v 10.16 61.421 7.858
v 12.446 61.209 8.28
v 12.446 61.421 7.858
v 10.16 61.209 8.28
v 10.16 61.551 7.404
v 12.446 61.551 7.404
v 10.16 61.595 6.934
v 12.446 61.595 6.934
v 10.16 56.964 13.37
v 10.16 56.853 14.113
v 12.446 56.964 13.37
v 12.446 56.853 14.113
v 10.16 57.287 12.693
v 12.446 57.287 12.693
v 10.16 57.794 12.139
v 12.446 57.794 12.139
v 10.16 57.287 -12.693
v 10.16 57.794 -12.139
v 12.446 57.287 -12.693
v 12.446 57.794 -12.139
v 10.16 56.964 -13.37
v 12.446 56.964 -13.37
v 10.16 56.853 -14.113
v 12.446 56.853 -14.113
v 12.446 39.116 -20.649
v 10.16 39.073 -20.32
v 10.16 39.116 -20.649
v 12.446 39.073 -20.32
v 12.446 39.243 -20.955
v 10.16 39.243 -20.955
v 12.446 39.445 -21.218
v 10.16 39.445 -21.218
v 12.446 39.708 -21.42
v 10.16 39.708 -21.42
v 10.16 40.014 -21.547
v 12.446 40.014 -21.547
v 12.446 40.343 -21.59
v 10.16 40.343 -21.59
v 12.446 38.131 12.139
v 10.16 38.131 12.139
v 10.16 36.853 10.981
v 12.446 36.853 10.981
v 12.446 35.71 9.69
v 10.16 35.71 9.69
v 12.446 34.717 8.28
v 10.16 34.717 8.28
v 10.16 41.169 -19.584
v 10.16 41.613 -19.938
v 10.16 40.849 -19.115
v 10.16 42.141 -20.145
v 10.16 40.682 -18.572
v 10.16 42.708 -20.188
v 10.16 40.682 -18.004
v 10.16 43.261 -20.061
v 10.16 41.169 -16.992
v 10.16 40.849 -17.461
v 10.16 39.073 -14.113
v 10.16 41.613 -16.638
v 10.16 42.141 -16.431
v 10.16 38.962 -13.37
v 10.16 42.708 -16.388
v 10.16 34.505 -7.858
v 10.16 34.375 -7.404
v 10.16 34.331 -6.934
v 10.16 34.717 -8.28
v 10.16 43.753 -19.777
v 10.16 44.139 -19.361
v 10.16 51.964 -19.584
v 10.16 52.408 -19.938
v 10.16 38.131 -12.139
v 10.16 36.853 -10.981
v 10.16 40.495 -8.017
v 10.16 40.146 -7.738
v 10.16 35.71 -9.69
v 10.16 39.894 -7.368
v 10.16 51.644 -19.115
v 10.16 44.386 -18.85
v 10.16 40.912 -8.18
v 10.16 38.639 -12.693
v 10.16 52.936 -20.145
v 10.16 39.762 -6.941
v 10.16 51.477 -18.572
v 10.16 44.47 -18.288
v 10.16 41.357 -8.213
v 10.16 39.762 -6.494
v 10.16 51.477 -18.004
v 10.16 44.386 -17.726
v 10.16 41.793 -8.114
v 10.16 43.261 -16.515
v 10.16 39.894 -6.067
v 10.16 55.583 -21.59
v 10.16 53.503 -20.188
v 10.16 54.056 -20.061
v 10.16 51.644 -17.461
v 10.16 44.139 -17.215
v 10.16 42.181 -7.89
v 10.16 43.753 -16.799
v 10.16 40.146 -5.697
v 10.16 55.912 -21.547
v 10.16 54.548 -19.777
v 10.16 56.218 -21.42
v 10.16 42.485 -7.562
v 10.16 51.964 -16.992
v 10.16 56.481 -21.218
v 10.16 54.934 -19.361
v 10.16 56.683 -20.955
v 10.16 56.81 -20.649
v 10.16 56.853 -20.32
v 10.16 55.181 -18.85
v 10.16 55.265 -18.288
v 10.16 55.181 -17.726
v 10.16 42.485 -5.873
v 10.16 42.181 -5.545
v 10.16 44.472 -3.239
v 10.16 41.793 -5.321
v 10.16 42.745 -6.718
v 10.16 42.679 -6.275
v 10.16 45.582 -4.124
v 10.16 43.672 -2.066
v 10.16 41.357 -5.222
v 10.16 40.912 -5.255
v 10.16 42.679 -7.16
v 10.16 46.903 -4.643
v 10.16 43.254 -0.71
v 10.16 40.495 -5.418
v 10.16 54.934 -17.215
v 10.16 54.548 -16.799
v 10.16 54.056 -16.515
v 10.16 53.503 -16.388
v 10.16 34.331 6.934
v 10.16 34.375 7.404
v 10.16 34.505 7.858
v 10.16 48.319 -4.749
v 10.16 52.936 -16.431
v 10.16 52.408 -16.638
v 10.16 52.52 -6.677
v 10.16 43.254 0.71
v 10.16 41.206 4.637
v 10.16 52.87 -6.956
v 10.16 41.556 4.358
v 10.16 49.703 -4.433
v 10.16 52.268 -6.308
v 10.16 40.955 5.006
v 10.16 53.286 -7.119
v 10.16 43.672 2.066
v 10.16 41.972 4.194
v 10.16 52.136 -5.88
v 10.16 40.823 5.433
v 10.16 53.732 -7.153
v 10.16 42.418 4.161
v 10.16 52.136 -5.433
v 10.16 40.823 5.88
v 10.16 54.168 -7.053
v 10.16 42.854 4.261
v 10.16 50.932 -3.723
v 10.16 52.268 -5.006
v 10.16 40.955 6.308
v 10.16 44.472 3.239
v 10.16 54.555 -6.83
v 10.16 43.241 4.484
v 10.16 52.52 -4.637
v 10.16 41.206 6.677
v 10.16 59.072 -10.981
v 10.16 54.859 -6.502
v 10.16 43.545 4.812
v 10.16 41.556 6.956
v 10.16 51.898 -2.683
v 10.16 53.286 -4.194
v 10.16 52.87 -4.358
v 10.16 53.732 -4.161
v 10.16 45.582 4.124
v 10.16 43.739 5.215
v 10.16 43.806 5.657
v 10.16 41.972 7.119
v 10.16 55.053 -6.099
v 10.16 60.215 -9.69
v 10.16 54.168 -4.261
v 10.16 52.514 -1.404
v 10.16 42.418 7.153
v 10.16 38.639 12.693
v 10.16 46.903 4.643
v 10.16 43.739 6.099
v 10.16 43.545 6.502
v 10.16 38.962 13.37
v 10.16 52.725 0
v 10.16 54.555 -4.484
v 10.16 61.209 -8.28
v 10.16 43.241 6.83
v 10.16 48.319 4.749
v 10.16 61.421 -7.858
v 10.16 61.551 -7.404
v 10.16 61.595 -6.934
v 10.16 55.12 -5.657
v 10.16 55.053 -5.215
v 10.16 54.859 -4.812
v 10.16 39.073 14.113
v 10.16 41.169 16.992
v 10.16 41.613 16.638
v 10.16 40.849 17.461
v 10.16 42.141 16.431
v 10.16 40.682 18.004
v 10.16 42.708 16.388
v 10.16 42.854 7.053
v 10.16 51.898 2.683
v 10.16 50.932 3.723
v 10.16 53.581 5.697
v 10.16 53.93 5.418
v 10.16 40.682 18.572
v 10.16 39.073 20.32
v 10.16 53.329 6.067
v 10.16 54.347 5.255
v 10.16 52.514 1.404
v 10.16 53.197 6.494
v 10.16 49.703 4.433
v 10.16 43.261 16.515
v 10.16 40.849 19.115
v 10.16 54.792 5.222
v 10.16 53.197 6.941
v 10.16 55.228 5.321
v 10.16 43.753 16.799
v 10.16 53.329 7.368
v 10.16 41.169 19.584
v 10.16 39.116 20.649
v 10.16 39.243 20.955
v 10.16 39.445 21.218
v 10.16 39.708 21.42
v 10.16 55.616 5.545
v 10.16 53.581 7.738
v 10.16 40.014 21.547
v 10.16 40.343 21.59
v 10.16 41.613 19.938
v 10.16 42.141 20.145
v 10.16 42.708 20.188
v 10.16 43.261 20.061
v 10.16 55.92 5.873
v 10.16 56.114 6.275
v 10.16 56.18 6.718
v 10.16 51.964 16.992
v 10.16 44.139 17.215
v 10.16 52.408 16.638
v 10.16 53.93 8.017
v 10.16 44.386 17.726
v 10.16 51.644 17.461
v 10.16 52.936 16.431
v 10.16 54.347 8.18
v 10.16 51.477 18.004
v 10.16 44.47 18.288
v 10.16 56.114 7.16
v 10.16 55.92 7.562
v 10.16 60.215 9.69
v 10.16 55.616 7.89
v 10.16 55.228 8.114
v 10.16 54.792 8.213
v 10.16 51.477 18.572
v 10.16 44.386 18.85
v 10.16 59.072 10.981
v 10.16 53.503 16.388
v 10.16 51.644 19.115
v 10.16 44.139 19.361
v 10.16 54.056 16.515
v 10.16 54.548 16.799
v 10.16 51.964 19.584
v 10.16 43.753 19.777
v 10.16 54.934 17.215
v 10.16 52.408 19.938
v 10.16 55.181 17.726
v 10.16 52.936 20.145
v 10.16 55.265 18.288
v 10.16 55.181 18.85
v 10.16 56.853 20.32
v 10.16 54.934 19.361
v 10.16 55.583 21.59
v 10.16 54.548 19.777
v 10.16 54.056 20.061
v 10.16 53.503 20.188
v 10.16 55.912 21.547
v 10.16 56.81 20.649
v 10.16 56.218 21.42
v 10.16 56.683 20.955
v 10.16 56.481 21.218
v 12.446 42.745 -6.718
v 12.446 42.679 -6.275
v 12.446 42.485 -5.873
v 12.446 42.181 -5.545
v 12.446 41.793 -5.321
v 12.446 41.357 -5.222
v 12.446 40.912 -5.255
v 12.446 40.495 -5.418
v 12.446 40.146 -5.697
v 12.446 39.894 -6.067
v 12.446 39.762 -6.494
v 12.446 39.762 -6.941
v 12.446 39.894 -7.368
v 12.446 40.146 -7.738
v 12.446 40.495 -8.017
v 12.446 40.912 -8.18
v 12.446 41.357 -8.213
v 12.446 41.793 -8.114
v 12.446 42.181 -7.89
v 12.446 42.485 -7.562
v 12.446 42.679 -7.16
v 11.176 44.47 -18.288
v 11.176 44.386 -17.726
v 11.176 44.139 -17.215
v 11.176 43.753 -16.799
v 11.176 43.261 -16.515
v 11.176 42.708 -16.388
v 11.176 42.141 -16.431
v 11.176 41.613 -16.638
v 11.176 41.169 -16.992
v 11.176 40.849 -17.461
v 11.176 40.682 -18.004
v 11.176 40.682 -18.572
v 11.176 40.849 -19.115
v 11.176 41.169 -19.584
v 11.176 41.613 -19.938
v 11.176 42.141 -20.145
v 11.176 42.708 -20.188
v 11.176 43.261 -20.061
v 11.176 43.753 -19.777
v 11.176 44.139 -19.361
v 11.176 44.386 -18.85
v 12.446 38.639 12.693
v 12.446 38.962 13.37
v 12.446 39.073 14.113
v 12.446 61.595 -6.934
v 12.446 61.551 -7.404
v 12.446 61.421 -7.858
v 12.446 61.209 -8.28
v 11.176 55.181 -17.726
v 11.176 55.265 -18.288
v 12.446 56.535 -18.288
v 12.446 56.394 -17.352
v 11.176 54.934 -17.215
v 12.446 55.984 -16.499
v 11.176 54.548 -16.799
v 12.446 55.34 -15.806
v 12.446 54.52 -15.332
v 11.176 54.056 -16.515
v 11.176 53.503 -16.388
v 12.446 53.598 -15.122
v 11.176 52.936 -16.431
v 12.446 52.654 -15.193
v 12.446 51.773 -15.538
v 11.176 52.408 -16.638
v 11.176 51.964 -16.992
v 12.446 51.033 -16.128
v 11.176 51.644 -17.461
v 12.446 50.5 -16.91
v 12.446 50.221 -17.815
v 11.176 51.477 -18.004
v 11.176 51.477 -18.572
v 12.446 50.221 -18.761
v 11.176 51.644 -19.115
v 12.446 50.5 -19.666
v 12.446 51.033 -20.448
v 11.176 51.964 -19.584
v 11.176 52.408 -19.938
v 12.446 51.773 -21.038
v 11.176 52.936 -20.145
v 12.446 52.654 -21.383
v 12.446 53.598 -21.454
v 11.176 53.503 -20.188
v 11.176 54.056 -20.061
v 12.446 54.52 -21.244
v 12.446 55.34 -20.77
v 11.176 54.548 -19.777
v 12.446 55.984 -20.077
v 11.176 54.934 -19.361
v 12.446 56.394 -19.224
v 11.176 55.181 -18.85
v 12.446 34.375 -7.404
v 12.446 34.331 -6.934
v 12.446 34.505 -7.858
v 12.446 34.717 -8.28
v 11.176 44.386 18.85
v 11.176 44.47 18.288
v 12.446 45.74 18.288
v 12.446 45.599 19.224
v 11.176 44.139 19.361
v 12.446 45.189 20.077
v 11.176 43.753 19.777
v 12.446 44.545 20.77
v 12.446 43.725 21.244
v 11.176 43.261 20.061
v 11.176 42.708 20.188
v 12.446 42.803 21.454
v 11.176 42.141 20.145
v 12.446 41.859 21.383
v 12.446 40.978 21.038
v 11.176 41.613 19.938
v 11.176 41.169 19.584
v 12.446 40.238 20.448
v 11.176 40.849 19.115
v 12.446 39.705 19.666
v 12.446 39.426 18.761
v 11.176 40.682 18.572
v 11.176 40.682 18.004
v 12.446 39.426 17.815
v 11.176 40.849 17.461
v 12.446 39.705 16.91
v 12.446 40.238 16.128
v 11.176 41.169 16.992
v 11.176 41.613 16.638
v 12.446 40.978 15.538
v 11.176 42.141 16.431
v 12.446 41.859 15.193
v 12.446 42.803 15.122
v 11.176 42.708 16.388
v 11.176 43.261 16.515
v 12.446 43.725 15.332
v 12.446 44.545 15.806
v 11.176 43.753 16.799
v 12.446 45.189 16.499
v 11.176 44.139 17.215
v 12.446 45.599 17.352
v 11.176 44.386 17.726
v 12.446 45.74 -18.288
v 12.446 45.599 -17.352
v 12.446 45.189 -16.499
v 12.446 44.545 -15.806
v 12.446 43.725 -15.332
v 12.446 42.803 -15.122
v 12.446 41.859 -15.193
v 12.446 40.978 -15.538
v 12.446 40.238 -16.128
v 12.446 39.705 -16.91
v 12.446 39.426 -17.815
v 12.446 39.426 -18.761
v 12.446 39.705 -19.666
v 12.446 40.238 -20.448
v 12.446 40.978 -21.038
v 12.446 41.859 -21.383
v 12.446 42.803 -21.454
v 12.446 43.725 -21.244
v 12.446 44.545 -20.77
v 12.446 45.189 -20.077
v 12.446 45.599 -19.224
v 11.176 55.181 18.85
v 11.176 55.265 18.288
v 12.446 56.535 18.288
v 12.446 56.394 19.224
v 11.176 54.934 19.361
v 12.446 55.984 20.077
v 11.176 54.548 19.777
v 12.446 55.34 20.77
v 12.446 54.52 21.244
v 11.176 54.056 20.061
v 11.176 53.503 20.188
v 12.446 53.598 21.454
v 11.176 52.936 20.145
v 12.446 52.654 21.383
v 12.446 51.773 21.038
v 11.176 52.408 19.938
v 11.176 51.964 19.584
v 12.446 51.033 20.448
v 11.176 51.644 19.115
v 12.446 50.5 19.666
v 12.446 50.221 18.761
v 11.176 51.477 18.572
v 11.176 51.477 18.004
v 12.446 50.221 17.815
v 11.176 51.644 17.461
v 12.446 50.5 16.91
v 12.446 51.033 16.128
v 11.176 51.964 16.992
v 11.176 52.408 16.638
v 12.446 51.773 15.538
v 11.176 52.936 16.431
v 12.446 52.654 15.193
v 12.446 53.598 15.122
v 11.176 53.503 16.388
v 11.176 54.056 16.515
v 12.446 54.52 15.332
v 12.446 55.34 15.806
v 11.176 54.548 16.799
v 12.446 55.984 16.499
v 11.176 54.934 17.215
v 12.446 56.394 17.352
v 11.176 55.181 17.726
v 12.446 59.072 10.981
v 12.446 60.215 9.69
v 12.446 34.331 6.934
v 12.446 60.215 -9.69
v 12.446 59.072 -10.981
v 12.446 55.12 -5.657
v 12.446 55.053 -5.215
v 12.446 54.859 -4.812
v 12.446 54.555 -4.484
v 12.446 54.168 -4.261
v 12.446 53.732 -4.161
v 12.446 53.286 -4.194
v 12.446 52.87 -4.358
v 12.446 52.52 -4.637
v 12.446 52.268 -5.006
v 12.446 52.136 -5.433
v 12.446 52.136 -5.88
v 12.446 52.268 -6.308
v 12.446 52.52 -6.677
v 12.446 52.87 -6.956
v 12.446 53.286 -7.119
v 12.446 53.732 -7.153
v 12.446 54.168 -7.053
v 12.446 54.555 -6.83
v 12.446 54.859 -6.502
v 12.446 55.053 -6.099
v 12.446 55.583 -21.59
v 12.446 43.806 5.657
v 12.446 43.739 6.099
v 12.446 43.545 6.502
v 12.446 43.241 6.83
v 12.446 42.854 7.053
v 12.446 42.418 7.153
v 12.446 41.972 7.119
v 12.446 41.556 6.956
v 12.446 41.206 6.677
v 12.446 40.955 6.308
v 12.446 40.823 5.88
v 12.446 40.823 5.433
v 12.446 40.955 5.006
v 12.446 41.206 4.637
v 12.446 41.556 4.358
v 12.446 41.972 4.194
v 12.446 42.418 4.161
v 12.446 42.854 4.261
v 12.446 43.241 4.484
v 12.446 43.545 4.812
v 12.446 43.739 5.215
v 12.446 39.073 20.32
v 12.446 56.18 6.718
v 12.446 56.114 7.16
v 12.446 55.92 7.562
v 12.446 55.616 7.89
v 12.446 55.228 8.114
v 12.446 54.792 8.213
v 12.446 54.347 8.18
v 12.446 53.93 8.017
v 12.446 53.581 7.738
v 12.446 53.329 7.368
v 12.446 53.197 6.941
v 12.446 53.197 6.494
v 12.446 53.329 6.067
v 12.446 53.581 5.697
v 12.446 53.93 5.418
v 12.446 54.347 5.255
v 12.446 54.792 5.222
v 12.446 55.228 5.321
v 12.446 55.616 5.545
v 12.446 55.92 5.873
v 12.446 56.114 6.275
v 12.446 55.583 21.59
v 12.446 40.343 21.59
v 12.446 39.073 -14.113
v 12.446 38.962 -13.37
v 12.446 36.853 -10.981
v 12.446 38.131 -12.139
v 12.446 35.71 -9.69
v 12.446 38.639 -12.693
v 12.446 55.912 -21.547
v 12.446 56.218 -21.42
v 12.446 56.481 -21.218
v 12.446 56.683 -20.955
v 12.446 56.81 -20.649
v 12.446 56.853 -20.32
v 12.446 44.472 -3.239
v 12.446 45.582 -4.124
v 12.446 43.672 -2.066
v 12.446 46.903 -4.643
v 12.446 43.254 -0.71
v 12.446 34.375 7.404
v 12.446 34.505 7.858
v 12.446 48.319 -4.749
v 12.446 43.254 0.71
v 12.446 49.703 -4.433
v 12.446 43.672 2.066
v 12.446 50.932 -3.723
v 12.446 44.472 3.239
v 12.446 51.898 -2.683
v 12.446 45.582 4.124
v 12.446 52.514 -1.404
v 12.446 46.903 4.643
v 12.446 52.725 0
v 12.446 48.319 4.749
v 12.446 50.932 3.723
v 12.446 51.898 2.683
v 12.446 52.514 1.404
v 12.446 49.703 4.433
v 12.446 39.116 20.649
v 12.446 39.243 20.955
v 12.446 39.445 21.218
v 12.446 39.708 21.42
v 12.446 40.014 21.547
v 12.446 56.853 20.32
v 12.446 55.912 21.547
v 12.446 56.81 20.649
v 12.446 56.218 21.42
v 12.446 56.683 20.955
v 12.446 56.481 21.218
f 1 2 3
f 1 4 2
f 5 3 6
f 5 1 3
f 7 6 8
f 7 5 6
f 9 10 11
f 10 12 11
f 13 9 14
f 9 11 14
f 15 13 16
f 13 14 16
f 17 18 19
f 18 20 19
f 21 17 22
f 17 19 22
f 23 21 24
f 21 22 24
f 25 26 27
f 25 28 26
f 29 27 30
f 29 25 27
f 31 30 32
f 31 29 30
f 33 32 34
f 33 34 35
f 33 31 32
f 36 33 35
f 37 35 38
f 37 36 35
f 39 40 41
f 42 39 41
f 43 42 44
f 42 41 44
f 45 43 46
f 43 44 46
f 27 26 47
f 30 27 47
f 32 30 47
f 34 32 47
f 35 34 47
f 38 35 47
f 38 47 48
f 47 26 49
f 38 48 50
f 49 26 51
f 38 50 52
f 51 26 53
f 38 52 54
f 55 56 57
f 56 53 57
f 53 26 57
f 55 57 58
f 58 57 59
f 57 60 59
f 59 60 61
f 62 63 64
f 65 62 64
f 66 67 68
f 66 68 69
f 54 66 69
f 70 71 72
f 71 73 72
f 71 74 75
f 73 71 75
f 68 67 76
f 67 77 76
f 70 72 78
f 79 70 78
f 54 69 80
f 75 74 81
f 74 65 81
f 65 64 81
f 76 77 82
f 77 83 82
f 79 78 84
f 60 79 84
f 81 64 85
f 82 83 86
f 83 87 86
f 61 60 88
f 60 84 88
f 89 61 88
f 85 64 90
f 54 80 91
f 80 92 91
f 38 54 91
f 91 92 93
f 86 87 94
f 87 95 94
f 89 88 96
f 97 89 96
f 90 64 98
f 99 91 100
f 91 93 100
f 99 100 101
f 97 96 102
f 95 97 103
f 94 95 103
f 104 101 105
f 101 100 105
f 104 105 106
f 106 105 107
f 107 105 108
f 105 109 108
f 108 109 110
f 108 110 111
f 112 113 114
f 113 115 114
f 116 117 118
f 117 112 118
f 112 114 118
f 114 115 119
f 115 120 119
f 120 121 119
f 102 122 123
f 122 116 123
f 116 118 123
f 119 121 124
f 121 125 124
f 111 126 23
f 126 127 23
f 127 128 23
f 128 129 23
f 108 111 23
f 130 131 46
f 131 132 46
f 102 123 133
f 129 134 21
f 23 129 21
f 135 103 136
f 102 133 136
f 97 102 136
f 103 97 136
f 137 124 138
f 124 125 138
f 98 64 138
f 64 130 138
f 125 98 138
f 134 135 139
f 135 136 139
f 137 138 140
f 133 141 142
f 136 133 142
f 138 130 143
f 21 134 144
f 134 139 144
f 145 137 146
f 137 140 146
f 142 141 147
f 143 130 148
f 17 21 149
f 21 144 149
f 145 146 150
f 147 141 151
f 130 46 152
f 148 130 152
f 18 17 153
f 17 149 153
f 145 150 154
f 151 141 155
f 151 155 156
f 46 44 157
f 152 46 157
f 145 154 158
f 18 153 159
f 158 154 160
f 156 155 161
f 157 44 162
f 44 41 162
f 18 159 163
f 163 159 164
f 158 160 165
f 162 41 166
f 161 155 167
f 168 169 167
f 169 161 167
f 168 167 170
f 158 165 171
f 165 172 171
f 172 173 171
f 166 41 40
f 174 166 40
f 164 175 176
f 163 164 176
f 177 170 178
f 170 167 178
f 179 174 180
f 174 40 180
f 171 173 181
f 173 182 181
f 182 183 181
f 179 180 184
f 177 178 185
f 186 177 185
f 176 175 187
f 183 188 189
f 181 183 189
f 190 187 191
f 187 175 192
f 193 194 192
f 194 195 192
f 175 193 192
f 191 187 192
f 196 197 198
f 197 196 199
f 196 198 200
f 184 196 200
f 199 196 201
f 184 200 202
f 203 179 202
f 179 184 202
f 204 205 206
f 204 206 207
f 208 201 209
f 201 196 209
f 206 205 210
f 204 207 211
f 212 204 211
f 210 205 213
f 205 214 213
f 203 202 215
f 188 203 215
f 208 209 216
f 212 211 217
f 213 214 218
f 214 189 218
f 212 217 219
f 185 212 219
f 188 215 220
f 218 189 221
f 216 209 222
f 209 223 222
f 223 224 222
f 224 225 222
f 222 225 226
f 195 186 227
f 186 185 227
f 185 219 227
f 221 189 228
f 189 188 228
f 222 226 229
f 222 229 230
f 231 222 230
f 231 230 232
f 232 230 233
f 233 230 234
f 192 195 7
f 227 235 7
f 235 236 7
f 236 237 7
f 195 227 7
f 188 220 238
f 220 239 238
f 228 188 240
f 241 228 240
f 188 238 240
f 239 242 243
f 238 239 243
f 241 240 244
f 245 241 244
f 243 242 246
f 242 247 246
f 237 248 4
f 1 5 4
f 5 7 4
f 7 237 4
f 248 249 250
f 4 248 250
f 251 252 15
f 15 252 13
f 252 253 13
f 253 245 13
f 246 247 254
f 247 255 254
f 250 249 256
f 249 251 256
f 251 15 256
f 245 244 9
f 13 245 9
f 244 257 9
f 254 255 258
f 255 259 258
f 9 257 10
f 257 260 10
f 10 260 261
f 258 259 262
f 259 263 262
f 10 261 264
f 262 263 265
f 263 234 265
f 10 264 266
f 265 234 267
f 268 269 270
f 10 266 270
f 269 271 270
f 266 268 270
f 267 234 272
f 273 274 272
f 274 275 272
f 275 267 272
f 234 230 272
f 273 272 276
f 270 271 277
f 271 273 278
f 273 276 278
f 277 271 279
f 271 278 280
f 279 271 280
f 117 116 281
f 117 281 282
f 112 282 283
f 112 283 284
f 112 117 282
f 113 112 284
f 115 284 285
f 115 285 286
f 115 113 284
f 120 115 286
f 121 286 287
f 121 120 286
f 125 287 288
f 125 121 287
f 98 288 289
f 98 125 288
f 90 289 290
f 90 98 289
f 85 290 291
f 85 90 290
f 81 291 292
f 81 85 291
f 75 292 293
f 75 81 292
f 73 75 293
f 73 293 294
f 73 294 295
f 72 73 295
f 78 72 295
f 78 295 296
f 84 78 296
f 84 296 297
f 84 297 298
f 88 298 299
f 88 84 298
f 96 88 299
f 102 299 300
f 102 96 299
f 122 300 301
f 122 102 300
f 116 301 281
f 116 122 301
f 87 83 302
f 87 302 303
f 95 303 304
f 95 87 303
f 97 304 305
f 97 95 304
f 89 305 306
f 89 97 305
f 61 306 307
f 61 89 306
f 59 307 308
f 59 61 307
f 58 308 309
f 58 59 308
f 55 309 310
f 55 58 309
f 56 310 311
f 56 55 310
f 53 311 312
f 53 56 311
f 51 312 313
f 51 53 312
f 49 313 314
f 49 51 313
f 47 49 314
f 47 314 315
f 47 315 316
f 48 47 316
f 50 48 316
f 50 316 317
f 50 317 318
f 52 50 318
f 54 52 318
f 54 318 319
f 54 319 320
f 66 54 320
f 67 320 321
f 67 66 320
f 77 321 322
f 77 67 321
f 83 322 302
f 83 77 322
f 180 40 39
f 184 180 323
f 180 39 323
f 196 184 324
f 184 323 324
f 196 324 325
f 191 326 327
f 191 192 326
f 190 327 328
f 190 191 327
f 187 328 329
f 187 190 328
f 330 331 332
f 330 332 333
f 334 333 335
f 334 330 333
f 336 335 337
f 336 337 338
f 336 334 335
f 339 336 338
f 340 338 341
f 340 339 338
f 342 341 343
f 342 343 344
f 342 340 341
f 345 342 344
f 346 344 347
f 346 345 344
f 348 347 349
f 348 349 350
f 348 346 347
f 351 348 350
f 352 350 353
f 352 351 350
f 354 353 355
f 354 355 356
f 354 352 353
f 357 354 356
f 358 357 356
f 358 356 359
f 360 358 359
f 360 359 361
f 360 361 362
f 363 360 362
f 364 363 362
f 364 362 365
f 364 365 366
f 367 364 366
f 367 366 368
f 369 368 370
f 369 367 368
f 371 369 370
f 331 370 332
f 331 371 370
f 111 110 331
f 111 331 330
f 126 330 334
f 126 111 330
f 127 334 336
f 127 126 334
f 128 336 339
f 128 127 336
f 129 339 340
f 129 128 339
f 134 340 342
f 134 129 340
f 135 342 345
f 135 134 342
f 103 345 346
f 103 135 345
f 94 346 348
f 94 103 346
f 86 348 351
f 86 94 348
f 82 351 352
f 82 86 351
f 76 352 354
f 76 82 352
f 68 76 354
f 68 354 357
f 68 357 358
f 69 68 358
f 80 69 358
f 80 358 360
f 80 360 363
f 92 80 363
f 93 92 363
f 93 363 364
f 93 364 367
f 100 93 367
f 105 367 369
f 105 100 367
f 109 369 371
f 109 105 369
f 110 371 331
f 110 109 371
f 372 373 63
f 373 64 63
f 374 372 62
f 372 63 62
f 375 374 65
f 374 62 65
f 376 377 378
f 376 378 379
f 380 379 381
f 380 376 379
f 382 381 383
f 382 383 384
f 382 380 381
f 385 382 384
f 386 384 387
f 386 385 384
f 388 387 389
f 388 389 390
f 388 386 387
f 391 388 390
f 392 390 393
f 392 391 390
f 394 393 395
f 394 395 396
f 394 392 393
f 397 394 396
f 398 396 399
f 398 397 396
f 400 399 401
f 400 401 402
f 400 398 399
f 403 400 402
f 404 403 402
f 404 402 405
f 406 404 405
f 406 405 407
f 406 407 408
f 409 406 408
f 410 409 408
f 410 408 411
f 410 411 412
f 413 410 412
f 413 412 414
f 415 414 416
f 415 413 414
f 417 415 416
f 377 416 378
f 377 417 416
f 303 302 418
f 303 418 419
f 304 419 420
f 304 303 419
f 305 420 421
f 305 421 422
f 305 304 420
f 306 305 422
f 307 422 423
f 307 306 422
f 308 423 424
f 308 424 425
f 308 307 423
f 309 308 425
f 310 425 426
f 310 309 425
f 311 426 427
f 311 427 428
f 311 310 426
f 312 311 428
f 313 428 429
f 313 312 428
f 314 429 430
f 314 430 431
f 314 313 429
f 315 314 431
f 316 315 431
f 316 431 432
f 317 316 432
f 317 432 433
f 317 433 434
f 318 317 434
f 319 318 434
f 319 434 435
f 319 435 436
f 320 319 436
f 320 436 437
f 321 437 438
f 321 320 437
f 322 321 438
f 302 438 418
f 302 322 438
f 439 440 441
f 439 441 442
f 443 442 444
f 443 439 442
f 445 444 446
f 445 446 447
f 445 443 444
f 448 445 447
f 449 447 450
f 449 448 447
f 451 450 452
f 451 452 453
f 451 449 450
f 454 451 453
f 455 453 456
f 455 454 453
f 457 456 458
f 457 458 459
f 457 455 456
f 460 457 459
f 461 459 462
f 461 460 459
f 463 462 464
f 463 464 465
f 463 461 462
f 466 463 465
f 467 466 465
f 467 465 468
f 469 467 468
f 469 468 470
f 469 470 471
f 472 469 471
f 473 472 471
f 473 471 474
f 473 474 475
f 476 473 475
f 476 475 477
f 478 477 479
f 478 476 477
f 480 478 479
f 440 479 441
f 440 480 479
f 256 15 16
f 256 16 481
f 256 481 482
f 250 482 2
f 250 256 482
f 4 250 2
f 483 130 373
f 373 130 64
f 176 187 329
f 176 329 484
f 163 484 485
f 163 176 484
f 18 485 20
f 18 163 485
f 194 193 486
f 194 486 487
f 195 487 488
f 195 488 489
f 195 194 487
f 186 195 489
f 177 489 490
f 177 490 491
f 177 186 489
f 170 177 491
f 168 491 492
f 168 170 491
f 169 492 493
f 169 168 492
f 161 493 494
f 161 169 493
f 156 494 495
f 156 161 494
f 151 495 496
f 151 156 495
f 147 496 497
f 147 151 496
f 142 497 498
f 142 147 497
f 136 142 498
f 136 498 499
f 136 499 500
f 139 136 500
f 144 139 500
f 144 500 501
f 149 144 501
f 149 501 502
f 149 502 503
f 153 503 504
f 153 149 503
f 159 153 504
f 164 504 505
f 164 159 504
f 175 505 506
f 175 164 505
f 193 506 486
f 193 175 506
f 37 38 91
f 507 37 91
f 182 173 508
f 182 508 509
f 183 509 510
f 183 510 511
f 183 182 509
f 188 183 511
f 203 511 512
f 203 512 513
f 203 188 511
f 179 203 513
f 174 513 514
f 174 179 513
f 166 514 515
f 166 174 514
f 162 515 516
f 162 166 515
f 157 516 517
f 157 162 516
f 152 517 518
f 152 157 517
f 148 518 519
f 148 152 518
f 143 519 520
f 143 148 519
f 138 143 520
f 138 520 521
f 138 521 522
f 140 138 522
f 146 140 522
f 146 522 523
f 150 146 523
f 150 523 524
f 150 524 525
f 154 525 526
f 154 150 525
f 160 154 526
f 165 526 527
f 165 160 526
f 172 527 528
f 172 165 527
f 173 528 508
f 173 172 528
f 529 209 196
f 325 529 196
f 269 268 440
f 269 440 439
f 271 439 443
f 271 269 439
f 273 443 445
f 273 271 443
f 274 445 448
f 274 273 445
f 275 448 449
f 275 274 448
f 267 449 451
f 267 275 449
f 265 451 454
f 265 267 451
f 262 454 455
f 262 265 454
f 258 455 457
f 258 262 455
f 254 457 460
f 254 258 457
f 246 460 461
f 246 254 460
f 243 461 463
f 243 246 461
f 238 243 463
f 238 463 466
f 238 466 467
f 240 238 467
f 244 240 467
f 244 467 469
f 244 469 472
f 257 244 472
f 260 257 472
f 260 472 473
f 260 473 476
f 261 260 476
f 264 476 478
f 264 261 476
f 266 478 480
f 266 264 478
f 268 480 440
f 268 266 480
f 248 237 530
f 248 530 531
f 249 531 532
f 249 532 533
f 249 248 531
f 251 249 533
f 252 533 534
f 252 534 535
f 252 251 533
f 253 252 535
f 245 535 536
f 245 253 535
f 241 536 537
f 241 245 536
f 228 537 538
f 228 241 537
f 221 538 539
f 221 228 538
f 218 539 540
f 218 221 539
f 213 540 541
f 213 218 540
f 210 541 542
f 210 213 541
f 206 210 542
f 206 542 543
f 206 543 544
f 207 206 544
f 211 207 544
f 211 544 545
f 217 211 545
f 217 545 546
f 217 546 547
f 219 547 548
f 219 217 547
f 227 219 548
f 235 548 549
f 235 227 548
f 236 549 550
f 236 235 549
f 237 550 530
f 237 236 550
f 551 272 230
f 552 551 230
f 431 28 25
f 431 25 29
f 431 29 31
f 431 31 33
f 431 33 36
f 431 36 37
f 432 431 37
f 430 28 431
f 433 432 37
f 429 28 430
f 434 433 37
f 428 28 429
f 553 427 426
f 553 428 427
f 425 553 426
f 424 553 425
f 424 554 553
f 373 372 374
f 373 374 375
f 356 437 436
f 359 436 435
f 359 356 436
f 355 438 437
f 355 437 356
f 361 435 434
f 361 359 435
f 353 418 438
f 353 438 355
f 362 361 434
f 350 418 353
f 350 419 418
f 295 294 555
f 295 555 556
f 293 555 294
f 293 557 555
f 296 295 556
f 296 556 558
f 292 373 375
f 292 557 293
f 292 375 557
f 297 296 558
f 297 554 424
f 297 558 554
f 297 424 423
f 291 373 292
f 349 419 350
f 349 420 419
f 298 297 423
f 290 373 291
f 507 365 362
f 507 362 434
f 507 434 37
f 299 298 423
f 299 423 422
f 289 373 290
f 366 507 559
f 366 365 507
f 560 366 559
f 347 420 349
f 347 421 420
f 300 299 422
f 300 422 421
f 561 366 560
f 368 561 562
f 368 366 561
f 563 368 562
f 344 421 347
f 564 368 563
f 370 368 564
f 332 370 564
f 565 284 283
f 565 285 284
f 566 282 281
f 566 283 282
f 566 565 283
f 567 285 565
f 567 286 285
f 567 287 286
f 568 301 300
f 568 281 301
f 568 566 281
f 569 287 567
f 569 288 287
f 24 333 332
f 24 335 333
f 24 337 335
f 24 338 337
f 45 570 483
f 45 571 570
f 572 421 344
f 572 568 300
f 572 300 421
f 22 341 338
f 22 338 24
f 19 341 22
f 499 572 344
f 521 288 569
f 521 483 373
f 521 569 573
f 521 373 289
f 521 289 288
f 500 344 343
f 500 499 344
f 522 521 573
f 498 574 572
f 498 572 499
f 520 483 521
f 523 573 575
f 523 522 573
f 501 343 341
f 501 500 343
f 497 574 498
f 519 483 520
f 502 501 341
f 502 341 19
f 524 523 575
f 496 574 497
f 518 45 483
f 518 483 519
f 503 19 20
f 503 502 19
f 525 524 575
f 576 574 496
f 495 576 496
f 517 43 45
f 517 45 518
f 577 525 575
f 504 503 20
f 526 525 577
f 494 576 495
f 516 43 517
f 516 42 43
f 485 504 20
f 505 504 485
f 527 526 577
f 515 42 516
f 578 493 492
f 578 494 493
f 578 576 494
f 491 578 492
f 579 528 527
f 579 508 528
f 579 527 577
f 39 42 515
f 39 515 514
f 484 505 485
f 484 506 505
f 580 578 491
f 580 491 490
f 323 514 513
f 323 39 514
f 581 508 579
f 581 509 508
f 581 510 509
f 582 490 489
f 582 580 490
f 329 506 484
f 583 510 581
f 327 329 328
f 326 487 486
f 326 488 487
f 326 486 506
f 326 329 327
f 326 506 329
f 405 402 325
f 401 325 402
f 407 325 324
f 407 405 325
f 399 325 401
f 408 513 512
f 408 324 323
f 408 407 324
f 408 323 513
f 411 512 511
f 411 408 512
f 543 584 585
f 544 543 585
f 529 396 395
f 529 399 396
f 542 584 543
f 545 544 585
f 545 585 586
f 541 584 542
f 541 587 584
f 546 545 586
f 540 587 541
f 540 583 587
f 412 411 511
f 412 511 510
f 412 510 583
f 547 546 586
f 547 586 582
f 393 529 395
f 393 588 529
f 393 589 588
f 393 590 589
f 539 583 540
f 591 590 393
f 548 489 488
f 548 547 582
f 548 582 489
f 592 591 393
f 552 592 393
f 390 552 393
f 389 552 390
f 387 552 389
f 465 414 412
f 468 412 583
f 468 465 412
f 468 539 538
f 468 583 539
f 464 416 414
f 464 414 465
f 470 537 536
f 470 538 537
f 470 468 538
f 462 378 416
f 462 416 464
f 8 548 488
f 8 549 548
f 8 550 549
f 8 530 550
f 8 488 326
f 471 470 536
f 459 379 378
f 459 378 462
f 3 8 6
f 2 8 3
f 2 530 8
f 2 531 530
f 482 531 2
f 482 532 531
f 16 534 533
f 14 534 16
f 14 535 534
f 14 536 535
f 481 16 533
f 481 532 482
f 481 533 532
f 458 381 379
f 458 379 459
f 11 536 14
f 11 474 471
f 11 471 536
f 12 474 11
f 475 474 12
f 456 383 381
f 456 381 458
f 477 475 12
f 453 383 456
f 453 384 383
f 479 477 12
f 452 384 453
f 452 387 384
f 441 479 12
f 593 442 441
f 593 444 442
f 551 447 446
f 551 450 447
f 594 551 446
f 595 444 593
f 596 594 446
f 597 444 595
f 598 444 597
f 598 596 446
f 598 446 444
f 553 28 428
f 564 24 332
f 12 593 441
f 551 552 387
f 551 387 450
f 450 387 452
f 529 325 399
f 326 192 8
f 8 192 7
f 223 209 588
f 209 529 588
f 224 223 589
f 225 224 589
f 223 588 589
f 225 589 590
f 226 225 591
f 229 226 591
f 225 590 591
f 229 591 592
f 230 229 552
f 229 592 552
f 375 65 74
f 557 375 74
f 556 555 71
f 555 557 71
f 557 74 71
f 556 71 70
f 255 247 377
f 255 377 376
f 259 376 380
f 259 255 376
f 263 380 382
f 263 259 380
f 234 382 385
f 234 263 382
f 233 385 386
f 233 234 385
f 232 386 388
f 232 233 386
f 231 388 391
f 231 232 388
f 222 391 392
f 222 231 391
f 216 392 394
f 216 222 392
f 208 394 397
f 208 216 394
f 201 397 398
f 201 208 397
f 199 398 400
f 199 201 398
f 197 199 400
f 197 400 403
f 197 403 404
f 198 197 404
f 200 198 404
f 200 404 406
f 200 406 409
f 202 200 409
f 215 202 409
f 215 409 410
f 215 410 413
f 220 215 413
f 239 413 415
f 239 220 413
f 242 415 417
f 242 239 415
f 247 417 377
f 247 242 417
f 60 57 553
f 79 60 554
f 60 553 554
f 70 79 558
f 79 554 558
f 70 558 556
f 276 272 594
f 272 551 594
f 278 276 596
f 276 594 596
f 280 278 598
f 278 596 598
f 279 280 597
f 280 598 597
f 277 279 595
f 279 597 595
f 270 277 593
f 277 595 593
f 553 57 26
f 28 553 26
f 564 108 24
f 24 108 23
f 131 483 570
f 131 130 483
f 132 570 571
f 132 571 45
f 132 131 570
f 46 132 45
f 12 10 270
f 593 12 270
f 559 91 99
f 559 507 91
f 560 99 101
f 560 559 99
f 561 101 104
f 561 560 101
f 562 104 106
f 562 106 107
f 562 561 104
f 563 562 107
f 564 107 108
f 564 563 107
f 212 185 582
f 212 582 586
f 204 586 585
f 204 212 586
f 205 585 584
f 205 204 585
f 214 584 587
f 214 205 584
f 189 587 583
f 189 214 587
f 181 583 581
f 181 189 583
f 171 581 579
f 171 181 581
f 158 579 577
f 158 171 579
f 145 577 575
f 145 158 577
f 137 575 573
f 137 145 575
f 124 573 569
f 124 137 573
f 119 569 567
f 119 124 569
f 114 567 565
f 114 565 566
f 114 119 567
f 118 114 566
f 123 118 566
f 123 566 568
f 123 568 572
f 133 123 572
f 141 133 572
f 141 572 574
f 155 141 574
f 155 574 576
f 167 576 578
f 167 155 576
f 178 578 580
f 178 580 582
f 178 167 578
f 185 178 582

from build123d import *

# Parameters (mm, degrees)
STOCK_DGT_START                               = 10.16
STOCK_DGT_INSIDE_SWERVE_STRUCTURE_SM_2_R      = 1.905
STOCK_DGT_INSIDE_SWERVE_STRUCTURE_SM_2_R_2    = 1.5
STOCK_DGT_INSIDE_SWERVE_STRUCTURE_SM_2_R_3    = 4.7625
STOCK_DGT_INSIDE_SWERVE_STRUCTURE_SMALL_DEPTH = 2.286
CUT_EXTRUDE2_DEPTH                            = 66.309248357
FILLET1_R                                     = 2.54
FILLET2_R                                     = 1.27
CHAMFER1_SIZE                                 = 1.27


# Read off the part's stored shape, not the designer's step: Stock-DGT inside swerve structure Small Bearing-1
with BuildPart() as part:
    # Stock-DGT inside swerve structure Sm 2 → Stock-DGT inside swerve structure Small Bearing-1 (new body)
    with BuildSketch(Plane.YZ.offset(STOCK_DGT_START)):
        with BuildLine():
            ThreePointArc((34.33064, -8.13506567), (36.425690436, -10.904598407), (39.07282, -13.152320138))
            Line((39.07282, -13.152320138), (39.07282, -21.59))
            Line((39.07282, -21.59), (56.85282, -21.59))
            Line((56.85282, -21.59), (56.85282, -13.152320138))
            ThreePointArc((56.85282, -13.152320138), (59.499949564, -10.904598407), (61.595, -8.13506567))
            Line((61.595, -8.13506567), (61.595, 8.13506567))
            ThreePointArc((61.595, 8.13506567), (59.499949564, 10.904598407), (56.85282, 13.152320138))
            Line((56.85282, 13.152320138), (56.85282, 21.59))
            Line((56.85282, 21.59), (39.07282, 21.59))
            Line((39.07282, 21.59), (39.07282, 13.152320138))
            ThreePointArc((39.07282, 13.152320138), (36.425690436, 10.904598407), (34.33064, 8.13506567))
            Line((34.33064, 8.13506567), (34.33064, -8.13506567))
        make_face()
        with Locations((42.56532, -18.288)):
            Circle(STOCK_DGT_INSIDE_SWERVE_STRUCTURE_SM_2_R, mode=Mode.SUBTRACT)
        with Locations((41.245305579, -6.717514421)):
            Circle(STOCK_DGT_INSIDE_SWERVE_STRUCTURE_SM_2_R_2, mode=Mode.SUBTRACT)
        with Locations((53.36032, -18.288)):
            Circle(STOCK_DGT_INSIDE_SWERVE_STRUCTURE_SM_2_R, mode=Mode.SUBTRACT)
        with Locations((53.619674249, -5.656854249)):
            Circle(STOCK_DGT_INSIDE_SWERVE_STRUCTURE_SM_2_R_2, mode=Mode.SUBTRACT)
        with Locations((42.305965751, 5.656854249)):
            Circle(STOCK_DGT_INSIDE_SWERVE_STRUCTURE_SM_2_R_2, mode=Mode.SUBTRACT)
        with Locations((42.56532, 18.288)):
            Circle(STOCK_DGT_INSIDE_SWERVE_STRUCTURE_SM_2_R, mode=Mode.SUBTRACT)
        with Locations((47.96282, 0)):
            Circle(STOCK_DGT_INSIDE_SWERVE_STRUCTURE_SM_2_R_3, mode=Mode.SUBTRACT)
        with Locations((54.680334421, 6.717514421)):
            Circle(STOCK_DGT_INSIDE_SWERVE_STRUCTURE_SM_2_R_2, mode=Mode.SUBTRACT)
        with Locations((53.36032, 18.288)):
            Circle(STOCK_DGT_INSIDE_SWERVE_STRUCTURE_SM_2_R, mode=Mode.SUBTRACT)
    extrude(amount=STOCK_DGT_INSIDE_SWERVE_STRUCTURE_SMALL_DEPTH)

    # Sketch2 → Cut-Extrude2 (cut, through all)
    with BuildSketch(Plane.ZY.offset(-10.16)):
        with BuildLine():
            Line((-12.844591897, 56.85282), (-13.152320138, 56.85282))
            ThreePointArc((-13.152320138, 56.85282), (0, 63.83782), (13.152320138, 56.85282))
            Line((13.152320138, 56.85282), (12.844591897, 56.85282))
            ThreePointArc((12.844591897, 56.85282), (0, 63.58382), (-12.844591897, 56.85282))
        make_face()
        with BuildLine():
            Line((13.152320138, 39.07282), (12.844591897, 39.07282))
            ThreePointArc((12.844591897, 39.07282), (0, 32.34182), (-12.844591897, 39.07282))
            Line((-12.844591897, 39.07282), (-13.152320138, 39.07282))
            ThreePointArc((-13.152320138, 39.07282), (0, 32.08782), (13.152320138, 39.07282))
        make_face()
    extrude(amount=-CUT_EXTRUDE2_DEPTH, mode=Mode.SUBTRACT)

    # Fillet1
    fillet1_edges = [part.edges().sort_by_distance(p)[0] for p in [
        (11.303, 34.33064, 7.627536263),
        (11.303, 34.33064, -7.627536263),
        (11.303, 61.595, -7.627536263),
        (11.303, 61.595, 7.627536263),
        (11.303, 56.85282, 12.844591897),
        (11.303, 56.85282, -12.844591897),
        (11.303, 39.07282, -12.844591897),
        (11.303, 39.07282, 12.844591897),
    ]]
    fillet(fillet1_edges, radius=FILLET1_R)

    # Fillet2
    fillet2_edges = [part.edges().sort_by_distance(p)[0] for p in [
        (11.303, 39.07282, 21.59),
        (11.303, 56.85282, 21.59),
        (11.303, 56.85282, -21.59),
        (11.303, 39.07282, -21.59),
    ]]
    fillet(fillet2_edges, radius=FILLET2_R)

    # Chamfer1
    chamfer1_edges = [part.edges().sort_by_distance(p)[0] for p in [
        (12.446, 51.45532, 18.288),
        (12.446, 40.66032, -18.288),
        (12.446, 51.45532, -18.288),
        (12.446, 40.66032, 18.288),
    ]]
    chamfer(chamfer1_edges, length=CHAMFER1_SIZE)


solid = part.part
